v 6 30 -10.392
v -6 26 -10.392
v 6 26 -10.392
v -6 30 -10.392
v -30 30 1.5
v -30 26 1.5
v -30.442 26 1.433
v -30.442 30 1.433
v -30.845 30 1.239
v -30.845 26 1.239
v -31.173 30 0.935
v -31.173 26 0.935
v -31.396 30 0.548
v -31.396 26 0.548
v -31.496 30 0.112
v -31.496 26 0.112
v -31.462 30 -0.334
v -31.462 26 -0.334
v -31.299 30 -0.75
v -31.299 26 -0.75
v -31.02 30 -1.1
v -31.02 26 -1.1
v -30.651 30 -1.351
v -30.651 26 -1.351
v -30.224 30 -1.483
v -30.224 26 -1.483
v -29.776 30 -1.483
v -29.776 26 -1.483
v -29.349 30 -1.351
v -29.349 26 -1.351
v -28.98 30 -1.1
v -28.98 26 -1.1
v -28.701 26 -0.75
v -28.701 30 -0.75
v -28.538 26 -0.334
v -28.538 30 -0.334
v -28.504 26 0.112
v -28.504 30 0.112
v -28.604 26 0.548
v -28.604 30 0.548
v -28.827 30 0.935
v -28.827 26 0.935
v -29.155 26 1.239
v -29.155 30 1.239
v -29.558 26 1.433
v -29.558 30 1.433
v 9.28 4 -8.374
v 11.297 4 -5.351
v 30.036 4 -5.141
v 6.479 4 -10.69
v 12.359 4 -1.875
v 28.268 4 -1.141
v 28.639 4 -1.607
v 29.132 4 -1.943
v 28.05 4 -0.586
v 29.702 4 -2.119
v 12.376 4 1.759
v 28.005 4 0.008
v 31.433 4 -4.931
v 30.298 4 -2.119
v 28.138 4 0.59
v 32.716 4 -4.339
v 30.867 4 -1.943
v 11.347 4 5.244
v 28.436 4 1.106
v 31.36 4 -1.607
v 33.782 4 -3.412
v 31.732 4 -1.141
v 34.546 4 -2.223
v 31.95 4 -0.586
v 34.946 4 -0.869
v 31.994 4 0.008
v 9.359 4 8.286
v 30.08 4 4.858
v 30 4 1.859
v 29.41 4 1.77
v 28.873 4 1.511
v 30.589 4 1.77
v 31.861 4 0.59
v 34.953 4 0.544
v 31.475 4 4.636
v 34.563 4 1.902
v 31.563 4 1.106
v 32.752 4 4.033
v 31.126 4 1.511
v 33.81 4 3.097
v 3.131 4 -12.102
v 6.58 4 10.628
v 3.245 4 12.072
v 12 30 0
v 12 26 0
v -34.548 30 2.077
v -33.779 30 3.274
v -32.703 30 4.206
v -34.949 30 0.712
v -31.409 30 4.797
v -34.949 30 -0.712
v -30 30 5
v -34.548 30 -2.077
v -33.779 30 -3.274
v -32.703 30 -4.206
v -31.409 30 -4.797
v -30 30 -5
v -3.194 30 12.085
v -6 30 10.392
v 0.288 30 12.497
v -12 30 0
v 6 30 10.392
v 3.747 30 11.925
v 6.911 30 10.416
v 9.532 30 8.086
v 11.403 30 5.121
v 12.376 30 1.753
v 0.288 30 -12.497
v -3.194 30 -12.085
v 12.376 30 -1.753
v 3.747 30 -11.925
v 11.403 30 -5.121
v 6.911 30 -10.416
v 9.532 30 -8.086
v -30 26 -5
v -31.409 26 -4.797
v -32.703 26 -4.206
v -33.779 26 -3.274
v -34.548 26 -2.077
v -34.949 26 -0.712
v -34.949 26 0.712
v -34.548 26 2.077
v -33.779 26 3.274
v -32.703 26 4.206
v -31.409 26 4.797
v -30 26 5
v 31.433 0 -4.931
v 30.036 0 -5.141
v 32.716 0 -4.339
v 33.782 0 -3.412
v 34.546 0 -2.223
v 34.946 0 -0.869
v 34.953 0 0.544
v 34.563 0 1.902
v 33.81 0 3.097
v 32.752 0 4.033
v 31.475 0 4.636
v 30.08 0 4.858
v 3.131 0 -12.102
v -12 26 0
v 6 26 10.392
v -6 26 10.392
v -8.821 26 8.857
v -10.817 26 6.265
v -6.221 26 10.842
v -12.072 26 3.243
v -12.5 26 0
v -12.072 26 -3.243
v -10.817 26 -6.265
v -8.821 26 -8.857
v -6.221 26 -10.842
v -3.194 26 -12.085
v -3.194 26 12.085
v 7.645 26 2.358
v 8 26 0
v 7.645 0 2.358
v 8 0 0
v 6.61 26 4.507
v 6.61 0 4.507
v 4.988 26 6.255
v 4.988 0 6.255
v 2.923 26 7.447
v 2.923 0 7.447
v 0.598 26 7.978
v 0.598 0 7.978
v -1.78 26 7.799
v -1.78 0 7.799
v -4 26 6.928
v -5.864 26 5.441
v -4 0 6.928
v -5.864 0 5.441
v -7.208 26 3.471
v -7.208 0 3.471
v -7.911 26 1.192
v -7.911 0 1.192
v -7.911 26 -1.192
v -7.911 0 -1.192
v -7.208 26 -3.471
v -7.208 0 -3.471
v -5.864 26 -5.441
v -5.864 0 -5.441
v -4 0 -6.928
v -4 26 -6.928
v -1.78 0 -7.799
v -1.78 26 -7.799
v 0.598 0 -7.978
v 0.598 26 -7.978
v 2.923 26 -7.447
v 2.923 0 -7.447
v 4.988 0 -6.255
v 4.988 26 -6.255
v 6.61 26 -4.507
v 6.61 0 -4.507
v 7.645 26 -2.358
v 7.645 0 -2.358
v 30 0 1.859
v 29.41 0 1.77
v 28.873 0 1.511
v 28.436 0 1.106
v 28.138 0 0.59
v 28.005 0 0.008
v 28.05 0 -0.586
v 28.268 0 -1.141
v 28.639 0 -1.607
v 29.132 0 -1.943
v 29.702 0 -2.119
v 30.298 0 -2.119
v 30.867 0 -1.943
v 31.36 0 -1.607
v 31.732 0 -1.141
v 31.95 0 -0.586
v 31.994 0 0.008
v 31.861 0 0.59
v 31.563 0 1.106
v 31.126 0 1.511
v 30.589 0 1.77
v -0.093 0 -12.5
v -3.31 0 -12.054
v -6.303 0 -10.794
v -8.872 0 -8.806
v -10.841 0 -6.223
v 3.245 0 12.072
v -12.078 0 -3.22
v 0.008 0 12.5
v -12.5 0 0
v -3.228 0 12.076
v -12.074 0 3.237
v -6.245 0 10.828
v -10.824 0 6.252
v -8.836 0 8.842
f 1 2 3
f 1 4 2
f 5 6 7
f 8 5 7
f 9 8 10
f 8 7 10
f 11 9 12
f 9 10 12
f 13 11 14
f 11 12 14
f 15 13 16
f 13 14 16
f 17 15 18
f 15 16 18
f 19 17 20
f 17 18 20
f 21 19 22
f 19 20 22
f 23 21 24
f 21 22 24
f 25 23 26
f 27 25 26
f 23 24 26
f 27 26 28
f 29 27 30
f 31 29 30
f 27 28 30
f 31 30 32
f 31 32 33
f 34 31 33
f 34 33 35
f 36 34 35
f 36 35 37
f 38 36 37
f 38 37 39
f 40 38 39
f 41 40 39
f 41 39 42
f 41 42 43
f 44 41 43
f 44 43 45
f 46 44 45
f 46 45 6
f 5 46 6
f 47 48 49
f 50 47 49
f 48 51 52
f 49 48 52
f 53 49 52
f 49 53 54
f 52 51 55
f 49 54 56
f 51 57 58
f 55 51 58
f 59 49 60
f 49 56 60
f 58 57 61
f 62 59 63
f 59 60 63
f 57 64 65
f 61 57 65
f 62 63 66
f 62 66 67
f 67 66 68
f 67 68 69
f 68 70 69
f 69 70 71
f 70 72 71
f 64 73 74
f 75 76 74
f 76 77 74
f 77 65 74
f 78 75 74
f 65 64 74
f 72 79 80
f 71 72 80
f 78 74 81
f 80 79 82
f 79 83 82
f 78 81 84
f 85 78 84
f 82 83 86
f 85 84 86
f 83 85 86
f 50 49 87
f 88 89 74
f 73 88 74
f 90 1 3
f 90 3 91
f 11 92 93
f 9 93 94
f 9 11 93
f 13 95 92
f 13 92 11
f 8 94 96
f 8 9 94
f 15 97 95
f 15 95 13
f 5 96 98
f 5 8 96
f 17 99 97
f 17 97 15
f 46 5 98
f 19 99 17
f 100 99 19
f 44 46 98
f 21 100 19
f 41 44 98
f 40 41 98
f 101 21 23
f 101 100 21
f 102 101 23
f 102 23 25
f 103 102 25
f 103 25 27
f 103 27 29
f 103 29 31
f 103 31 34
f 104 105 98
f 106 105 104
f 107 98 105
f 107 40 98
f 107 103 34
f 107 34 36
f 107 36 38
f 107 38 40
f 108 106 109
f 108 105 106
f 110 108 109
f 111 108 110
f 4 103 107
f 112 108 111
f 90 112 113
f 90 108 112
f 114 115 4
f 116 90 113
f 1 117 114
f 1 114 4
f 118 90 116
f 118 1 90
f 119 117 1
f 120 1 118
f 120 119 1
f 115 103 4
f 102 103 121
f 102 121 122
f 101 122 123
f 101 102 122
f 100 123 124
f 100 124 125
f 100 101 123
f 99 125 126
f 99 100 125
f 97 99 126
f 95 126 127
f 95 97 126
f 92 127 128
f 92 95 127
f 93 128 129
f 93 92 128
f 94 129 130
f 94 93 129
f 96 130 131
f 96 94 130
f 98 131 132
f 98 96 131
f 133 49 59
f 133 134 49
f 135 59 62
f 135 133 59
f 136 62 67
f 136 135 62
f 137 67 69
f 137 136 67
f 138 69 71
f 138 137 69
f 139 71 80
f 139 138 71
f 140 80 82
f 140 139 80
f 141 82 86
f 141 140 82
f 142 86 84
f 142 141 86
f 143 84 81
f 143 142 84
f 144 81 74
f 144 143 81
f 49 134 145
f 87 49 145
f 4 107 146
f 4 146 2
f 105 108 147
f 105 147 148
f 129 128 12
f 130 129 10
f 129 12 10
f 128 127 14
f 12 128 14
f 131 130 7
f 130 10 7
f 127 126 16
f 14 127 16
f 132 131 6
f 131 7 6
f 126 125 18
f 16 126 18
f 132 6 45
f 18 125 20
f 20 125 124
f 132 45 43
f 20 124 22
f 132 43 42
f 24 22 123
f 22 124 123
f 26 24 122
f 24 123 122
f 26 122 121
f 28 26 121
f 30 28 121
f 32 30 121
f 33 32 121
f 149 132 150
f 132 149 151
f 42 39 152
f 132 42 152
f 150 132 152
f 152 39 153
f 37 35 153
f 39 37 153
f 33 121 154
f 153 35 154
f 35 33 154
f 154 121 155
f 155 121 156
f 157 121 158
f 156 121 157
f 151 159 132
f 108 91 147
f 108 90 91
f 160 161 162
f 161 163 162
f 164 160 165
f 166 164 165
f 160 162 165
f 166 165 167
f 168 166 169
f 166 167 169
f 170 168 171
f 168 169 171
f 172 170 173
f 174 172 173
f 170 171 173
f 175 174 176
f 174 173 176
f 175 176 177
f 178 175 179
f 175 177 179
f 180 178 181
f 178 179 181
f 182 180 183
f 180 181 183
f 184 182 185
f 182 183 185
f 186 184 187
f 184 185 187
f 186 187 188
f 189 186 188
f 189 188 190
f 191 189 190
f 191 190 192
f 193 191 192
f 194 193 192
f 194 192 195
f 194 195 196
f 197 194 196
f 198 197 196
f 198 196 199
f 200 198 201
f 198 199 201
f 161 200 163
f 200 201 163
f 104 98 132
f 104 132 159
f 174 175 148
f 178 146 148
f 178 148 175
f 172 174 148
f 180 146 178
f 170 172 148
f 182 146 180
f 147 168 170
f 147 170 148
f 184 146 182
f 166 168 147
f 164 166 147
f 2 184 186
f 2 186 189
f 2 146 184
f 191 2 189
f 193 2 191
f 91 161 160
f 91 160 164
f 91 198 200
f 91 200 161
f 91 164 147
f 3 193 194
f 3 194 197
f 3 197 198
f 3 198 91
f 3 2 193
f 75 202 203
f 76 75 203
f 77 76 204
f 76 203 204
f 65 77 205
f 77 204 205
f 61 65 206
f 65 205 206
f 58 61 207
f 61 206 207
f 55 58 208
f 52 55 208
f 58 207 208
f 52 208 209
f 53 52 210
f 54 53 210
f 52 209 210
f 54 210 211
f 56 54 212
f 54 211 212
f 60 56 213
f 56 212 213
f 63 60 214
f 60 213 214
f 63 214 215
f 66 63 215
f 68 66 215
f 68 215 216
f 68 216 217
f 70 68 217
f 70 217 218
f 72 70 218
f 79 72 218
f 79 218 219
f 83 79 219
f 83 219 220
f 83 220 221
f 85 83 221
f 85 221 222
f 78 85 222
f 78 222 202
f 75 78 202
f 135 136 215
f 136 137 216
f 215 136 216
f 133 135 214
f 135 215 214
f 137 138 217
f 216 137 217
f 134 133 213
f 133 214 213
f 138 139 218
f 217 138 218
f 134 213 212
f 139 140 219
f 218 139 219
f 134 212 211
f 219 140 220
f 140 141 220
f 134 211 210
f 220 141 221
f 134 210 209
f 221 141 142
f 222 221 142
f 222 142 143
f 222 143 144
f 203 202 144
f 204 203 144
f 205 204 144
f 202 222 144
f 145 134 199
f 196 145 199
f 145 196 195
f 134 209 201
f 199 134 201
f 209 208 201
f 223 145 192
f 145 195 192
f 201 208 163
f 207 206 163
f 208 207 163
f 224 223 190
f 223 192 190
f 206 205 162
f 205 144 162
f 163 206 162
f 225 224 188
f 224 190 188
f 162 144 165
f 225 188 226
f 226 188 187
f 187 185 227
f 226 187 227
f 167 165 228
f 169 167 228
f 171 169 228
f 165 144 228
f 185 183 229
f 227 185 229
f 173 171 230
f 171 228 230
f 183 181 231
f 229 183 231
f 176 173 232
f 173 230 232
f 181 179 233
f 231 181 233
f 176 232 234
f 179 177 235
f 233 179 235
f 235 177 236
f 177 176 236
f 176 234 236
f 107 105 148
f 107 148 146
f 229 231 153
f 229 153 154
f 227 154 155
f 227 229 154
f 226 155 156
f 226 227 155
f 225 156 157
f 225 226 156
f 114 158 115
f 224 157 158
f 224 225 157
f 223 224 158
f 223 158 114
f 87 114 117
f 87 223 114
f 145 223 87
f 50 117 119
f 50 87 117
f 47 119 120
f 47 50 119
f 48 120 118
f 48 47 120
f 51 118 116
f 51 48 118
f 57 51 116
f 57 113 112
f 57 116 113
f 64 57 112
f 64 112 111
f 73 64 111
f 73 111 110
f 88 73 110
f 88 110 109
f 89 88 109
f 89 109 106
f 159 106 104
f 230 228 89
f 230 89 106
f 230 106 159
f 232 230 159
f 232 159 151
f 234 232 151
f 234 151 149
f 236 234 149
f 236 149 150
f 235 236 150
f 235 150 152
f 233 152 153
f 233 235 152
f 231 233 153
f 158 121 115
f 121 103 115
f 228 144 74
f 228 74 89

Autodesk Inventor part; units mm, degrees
ref_plane "YZ Plane" through (0, 0, 0) normal (1, 0, 0) x (0, 1, 0)
ref_plane "XZ Plane" through (0, 0, 0) normal (0, 1, 0) x (-1, 0, 0)
sketch "Boceto1" plane through (0, 0, 0) normal (0, 1, 0) x (-1, 0, 0)
  circle A0 centre (0, 0) radius 12.5
  dimension "d0" = 25
extrude "Extrusión1" add sketch "Boceto1" along normal blind 30
sketch "Boceto2" plane through (0, 0, 0) normal (0, -1, 0) x (1, 0, 0)
  circle A0 centre (0, 0) radius 8
  dimension "d3" = 16
extrude "Extrusión2" cut sketch "Boceto2" against normal through all
sketch "Boceto3" plane through (0, 30, 0) normal (0, 1, 0) x (1, 0, 0)
  line L0 (6, 10.3923) -> (12, 0)
  line L1 (12, 0) -> (6, -10.3923)
  line L2 (6, -10.3923) -> (-6, -10.3923)
  line L3 (-6, -10.3923) -> (-12, 0)
  line L4 (-12, 0) -> (-6, 10.3923)
  line L5 (-6, 10.3923) -> (6, 10.3923)
  point P0 (0, 0)
  point P1 (0, 0)
  point P2 (0, 10.3923)
  dimension "d6" = 12
extrude "Extrusión3" cut sketch "Boceto3" against normal blind 4
sketch "Boceto4" plane through (0, 0, 0) normal (0, -1, 0) x (1, 0, 0)
  circle A0 centre (0, 0) radius 12.5 projected
  arc A1 (30.0364, -5.1409) -> (30.0797, 4.8584) centre (29.9997, -0.141) ccw
  line L0 (30.0364, -5.1409) -> (3.1308, -12.1016)
  circle A2 centre (0, 0) radius 12.5 projected
  line L1 (30.0797, 4.8584) -> (3.2448, 12.0715)
  dimension "d9" = 10
  dimension "d10" = 30
extrude "Extrusión4" add sketch "Boceto4" against normal blind 4 contours A0 L1 A1 L0
sketch "Boceto5" plane through (0, 30, 0) normal (0, 1, 0) x (1, 0, 0)
  arc A0 (-30, 5) -> (-30, -5) centre (-30, 0) ccw
  line L0 (-30, -5) -> (-3.1942, -12.085)
  circle A1 centre (0, 0) radius 12.5 projected
  line L1 (-30, 5) -> (-3.1942, 12.085)
  dimension "d13" = 10
  dimension "d14" = 30
extrude "Extrusión5" add sketch "Boceto5" against normal blind 4 contours L1 A1 L0 A0
hole "Agujero1" at (29.9997, 4, -0.141) direction (0, -1, 0) diameter 4 depth 8 tip angle 118
hole "Agujero2" at (-30, 30, 0) direction (0, -1, 0) diameter 3 depth 8 tip angle 118
properties part number "steering_stand_off" material "Goma"
